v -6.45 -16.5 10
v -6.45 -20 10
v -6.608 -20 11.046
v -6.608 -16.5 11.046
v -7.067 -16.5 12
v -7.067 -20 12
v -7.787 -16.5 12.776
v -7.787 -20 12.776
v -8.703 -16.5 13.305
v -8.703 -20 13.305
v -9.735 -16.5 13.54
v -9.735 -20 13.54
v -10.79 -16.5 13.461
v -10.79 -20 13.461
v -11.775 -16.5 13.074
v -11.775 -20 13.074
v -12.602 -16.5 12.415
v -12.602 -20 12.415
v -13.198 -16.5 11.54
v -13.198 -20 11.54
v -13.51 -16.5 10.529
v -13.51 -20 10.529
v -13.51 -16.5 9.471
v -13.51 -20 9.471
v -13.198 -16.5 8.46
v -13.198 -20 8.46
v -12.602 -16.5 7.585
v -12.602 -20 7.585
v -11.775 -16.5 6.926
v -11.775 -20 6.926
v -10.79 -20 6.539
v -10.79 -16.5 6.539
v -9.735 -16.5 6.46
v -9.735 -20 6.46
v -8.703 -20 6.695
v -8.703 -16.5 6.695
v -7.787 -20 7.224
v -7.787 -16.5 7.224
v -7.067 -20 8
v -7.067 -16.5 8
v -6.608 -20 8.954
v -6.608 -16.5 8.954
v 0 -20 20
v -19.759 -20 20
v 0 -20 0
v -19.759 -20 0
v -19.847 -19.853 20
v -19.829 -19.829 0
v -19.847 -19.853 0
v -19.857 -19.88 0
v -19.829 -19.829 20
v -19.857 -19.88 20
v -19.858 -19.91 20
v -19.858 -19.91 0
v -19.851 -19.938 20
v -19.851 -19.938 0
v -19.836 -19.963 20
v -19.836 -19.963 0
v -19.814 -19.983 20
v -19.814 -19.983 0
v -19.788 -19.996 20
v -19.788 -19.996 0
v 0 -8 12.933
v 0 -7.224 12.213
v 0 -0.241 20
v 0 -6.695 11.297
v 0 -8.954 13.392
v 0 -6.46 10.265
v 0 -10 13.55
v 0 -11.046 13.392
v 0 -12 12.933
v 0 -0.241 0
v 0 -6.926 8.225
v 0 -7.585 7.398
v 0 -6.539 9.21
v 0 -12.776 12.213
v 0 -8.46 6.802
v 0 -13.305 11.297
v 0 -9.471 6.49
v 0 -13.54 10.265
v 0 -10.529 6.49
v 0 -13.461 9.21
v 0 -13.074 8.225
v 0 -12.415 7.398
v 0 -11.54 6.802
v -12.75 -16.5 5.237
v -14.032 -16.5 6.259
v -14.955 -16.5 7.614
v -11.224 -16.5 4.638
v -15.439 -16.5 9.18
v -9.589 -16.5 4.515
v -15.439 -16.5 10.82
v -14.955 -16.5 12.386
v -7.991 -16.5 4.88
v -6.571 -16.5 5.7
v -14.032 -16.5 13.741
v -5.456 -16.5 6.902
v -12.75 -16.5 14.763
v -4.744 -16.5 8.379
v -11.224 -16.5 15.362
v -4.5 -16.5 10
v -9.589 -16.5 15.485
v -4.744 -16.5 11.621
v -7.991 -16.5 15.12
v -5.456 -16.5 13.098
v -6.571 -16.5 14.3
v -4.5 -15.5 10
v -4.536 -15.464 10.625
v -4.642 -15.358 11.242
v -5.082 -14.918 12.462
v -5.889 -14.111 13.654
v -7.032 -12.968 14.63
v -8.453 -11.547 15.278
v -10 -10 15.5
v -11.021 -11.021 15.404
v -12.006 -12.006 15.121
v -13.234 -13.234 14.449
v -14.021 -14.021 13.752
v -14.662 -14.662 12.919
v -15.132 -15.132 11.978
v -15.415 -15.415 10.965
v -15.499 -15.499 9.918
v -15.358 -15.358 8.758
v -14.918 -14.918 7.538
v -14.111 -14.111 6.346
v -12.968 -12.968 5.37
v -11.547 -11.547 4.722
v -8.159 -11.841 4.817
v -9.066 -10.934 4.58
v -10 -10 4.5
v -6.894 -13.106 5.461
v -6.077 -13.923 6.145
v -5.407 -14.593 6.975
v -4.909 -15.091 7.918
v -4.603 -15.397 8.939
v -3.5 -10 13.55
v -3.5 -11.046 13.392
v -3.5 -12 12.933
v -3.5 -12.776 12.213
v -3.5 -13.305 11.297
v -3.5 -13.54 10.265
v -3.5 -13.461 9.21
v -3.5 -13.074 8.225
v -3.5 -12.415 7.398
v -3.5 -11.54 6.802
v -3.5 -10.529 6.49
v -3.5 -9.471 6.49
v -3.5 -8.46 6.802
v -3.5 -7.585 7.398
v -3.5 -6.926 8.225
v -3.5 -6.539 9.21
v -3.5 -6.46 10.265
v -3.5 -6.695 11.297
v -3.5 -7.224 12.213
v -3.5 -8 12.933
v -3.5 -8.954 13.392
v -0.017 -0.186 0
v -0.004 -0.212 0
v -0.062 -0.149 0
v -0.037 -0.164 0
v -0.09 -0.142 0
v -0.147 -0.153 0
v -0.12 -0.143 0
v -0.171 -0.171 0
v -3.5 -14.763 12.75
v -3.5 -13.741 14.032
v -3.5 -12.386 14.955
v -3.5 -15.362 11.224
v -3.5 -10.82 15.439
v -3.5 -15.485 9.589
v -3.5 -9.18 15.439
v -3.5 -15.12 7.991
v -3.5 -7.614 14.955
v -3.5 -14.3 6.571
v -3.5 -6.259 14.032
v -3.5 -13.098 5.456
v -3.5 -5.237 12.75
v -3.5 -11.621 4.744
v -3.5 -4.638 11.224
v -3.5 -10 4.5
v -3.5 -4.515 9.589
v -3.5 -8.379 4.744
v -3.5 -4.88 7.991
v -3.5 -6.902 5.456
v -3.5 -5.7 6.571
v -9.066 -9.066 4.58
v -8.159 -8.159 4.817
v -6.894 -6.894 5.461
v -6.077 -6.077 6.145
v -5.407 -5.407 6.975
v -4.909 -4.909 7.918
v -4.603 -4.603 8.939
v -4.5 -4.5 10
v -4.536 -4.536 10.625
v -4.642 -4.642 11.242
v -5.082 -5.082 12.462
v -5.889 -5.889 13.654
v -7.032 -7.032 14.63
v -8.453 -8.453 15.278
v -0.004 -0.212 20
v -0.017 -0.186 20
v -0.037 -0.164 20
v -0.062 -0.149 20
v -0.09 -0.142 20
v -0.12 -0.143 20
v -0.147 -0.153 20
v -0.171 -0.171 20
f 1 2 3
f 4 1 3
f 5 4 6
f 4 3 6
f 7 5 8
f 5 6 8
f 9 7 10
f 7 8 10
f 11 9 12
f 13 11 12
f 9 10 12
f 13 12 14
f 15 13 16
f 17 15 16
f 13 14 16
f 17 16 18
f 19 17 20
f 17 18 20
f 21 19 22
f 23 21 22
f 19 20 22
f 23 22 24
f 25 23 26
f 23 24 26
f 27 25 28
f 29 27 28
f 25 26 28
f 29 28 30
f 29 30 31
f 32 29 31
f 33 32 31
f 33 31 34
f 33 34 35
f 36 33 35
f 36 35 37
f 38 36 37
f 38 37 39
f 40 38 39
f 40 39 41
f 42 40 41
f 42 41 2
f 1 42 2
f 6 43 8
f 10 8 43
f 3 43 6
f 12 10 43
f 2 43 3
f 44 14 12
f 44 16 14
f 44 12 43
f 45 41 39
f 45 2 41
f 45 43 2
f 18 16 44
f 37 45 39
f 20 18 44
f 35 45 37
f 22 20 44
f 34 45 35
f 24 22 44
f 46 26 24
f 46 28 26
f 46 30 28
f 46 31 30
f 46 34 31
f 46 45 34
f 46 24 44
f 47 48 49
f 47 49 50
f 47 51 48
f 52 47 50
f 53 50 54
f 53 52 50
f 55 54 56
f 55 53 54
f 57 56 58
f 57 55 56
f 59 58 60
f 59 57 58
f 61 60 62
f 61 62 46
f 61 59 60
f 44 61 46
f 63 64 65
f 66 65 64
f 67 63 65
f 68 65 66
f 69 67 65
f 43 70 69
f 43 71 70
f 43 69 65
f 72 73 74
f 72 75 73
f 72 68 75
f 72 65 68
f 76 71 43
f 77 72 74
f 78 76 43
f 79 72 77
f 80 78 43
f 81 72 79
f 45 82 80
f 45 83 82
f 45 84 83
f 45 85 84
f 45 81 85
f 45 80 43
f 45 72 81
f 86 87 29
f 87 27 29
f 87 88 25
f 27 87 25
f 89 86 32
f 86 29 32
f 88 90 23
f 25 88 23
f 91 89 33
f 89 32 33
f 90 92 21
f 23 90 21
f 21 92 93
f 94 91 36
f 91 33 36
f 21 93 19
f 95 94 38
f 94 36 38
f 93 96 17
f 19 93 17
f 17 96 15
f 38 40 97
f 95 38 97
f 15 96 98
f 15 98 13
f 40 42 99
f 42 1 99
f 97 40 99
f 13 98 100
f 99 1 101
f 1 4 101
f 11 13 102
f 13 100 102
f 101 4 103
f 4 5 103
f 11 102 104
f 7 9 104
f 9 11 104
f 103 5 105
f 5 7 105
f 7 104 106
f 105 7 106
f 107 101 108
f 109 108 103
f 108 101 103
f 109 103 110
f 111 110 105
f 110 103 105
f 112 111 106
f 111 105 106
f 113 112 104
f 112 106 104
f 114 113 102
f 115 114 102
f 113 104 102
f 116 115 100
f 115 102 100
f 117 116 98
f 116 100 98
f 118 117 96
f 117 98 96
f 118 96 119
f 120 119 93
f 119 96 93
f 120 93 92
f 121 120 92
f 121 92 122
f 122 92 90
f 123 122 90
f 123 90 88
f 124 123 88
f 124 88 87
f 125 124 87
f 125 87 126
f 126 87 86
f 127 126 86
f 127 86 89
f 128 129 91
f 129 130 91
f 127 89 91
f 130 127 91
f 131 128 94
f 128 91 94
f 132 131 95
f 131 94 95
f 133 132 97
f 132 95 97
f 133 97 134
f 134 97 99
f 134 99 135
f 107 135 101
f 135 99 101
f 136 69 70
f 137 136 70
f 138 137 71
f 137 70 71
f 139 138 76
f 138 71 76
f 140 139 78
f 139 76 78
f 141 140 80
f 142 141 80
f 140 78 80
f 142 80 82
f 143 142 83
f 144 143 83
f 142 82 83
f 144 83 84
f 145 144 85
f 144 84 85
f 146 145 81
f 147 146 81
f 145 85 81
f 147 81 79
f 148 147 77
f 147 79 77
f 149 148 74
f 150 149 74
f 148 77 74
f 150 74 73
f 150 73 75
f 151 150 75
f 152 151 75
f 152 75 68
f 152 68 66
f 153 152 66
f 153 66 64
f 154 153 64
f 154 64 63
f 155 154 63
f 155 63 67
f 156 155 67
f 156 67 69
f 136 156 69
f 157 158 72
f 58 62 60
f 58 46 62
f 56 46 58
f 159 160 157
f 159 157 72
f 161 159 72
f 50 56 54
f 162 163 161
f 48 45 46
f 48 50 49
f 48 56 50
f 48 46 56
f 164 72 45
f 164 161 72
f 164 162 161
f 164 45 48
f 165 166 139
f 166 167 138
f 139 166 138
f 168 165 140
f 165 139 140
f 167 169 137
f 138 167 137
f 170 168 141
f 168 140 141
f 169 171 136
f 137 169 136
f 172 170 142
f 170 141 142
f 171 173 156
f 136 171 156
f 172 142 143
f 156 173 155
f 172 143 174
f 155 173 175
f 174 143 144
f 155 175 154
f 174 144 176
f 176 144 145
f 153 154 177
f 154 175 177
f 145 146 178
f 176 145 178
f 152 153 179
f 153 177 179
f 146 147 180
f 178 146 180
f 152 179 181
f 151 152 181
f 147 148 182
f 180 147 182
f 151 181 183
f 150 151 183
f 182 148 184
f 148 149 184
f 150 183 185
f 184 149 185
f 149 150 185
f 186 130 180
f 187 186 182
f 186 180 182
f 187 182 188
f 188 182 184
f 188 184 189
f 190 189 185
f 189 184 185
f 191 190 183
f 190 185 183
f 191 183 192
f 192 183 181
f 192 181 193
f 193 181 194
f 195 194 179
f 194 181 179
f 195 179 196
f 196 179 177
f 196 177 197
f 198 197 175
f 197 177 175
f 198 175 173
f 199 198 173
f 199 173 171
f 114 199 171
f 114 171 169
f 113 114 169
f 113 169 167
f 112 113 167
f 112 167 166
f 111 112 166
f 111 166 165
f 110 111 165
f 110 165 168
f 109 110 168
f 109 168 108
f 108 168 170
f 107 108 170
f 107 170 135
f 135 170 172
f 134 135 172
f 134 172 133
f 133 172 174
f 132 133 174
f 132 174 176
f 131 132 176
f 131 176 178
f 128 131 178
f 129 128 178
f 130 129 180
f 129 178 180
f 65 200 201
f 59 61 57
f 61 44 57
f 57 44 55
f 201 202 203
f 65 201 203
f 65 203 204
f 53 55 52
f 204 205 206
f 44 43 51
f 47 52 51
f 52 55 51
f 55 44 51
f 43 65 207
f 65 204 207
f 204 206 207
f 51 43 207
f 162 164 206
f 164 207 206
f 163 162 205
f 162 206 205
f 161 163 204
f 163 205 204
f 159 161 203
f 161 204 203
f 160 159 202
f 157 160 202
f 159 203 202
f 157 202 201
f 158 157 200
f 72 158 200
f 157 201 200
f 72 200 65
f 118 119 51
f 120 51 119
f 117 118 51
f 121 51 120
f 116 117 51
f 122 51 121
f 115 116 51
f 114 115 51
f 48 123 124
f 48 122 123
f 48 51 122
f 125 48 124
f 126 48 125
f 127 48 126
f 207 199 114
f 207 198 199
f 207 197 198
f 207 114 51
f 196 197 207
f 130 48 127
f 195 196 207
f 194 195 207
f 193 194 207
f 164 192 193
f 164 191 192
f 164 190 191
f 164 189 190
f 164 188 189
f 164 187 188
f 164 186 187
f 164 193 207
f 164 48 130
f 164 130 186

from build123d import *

# Parameters (mm, degrees)
BOSS_EXTRU_1_DEPTH      = 20
ESQUISSE2_R             = 3.55
ENL_V_MAT_EXTRU_1_DEPTH = 21
ESQUISSE3_R             = 3.55
ENL_V_MAT_EXTRU_2_DEPTH = 21
ENL_V_START             = -3.5
ESQUISSE4_R             = 5.5
ENL_V_MAT_EXTRU_3_DEPTH = 17.5
ESQUISSE5_R             = 5.5
ENL_V_MAT_EXTRU_4_DEPTH = 17.5
CONG_1_R                = 0.1


with BuildPart() as part:
    # Esquisse1 → Boss.-Extru.1 (new body)
    with BuildSketch(Plane.XY):
        Polygon((-20, -20), (0, 0), (0, -20), align=None)
    extrude(amount=BOSS_EXTRU_1_DEPTH)

    # Esquisse2 → Enlèv. mat.-Extru.1 (cut, through all)
    with BuildSketch(Plane.XZ.offset(20)):
        with Locations((-10, 10)):
            Circle(ESQUISSE2_R)
    extrude(amount=-ENL_V_MAT_EXTRU_1_DEPTH, mode=Mode.SUBTRACT)

    # Esquisse3 → Enlèv. mat.-Extru.2 (cut, through all)
    with BuildSketch(Plane(origin=(0, 0, 0), x_dir=(0, 0, 1), z_dir=(1, 0, 0))):
        with Locations((10, 10)):
            Circle(ESQUISSE3_R)
    extrude(amount=-ENL_V_MAT_EXTRU_2_DEPTH, mode=Mode.SUBTRACT)

    # Esquisse4 → Enlèv. mat.-Extru.3 (cut, through all)
    with BuildSketch(Plane(origin=(0, 0, 0), x_dir=(0, 0, -1), z_dir=(1, 0, 0)).offset(ENL_V_START)):
        with Locations((-10, -10)):
            Circle(ESQUISSE4_R)
    extrude(amount=-ENL_V_MAT_EXTRU_3_DEPTH, mode=Mode.SUBTRACT)

    # Esquisse5 → Enlèv. mat.-Extru.4 (cut, through all)
    with BuildSketch(Plane.XZ.offset(20).offset(ENL_V_START)):
        with Locations((-10, 10)):
            Circle(ESQUISSE5_R)
    extrude(amount=-ENL_V_MAT_EXTRU_4_DEPTH, mode=Mode.SUBTRACT)

    # Congé1
    cong_1_edges = [part.edges().sort_by_distance(p)[0] for p in [
        (-20, -20, 10),
        (0, 0, 10),
    ]]
    fillet(cong_1_edges, radius=CONG_1_R)


solid = part.part
